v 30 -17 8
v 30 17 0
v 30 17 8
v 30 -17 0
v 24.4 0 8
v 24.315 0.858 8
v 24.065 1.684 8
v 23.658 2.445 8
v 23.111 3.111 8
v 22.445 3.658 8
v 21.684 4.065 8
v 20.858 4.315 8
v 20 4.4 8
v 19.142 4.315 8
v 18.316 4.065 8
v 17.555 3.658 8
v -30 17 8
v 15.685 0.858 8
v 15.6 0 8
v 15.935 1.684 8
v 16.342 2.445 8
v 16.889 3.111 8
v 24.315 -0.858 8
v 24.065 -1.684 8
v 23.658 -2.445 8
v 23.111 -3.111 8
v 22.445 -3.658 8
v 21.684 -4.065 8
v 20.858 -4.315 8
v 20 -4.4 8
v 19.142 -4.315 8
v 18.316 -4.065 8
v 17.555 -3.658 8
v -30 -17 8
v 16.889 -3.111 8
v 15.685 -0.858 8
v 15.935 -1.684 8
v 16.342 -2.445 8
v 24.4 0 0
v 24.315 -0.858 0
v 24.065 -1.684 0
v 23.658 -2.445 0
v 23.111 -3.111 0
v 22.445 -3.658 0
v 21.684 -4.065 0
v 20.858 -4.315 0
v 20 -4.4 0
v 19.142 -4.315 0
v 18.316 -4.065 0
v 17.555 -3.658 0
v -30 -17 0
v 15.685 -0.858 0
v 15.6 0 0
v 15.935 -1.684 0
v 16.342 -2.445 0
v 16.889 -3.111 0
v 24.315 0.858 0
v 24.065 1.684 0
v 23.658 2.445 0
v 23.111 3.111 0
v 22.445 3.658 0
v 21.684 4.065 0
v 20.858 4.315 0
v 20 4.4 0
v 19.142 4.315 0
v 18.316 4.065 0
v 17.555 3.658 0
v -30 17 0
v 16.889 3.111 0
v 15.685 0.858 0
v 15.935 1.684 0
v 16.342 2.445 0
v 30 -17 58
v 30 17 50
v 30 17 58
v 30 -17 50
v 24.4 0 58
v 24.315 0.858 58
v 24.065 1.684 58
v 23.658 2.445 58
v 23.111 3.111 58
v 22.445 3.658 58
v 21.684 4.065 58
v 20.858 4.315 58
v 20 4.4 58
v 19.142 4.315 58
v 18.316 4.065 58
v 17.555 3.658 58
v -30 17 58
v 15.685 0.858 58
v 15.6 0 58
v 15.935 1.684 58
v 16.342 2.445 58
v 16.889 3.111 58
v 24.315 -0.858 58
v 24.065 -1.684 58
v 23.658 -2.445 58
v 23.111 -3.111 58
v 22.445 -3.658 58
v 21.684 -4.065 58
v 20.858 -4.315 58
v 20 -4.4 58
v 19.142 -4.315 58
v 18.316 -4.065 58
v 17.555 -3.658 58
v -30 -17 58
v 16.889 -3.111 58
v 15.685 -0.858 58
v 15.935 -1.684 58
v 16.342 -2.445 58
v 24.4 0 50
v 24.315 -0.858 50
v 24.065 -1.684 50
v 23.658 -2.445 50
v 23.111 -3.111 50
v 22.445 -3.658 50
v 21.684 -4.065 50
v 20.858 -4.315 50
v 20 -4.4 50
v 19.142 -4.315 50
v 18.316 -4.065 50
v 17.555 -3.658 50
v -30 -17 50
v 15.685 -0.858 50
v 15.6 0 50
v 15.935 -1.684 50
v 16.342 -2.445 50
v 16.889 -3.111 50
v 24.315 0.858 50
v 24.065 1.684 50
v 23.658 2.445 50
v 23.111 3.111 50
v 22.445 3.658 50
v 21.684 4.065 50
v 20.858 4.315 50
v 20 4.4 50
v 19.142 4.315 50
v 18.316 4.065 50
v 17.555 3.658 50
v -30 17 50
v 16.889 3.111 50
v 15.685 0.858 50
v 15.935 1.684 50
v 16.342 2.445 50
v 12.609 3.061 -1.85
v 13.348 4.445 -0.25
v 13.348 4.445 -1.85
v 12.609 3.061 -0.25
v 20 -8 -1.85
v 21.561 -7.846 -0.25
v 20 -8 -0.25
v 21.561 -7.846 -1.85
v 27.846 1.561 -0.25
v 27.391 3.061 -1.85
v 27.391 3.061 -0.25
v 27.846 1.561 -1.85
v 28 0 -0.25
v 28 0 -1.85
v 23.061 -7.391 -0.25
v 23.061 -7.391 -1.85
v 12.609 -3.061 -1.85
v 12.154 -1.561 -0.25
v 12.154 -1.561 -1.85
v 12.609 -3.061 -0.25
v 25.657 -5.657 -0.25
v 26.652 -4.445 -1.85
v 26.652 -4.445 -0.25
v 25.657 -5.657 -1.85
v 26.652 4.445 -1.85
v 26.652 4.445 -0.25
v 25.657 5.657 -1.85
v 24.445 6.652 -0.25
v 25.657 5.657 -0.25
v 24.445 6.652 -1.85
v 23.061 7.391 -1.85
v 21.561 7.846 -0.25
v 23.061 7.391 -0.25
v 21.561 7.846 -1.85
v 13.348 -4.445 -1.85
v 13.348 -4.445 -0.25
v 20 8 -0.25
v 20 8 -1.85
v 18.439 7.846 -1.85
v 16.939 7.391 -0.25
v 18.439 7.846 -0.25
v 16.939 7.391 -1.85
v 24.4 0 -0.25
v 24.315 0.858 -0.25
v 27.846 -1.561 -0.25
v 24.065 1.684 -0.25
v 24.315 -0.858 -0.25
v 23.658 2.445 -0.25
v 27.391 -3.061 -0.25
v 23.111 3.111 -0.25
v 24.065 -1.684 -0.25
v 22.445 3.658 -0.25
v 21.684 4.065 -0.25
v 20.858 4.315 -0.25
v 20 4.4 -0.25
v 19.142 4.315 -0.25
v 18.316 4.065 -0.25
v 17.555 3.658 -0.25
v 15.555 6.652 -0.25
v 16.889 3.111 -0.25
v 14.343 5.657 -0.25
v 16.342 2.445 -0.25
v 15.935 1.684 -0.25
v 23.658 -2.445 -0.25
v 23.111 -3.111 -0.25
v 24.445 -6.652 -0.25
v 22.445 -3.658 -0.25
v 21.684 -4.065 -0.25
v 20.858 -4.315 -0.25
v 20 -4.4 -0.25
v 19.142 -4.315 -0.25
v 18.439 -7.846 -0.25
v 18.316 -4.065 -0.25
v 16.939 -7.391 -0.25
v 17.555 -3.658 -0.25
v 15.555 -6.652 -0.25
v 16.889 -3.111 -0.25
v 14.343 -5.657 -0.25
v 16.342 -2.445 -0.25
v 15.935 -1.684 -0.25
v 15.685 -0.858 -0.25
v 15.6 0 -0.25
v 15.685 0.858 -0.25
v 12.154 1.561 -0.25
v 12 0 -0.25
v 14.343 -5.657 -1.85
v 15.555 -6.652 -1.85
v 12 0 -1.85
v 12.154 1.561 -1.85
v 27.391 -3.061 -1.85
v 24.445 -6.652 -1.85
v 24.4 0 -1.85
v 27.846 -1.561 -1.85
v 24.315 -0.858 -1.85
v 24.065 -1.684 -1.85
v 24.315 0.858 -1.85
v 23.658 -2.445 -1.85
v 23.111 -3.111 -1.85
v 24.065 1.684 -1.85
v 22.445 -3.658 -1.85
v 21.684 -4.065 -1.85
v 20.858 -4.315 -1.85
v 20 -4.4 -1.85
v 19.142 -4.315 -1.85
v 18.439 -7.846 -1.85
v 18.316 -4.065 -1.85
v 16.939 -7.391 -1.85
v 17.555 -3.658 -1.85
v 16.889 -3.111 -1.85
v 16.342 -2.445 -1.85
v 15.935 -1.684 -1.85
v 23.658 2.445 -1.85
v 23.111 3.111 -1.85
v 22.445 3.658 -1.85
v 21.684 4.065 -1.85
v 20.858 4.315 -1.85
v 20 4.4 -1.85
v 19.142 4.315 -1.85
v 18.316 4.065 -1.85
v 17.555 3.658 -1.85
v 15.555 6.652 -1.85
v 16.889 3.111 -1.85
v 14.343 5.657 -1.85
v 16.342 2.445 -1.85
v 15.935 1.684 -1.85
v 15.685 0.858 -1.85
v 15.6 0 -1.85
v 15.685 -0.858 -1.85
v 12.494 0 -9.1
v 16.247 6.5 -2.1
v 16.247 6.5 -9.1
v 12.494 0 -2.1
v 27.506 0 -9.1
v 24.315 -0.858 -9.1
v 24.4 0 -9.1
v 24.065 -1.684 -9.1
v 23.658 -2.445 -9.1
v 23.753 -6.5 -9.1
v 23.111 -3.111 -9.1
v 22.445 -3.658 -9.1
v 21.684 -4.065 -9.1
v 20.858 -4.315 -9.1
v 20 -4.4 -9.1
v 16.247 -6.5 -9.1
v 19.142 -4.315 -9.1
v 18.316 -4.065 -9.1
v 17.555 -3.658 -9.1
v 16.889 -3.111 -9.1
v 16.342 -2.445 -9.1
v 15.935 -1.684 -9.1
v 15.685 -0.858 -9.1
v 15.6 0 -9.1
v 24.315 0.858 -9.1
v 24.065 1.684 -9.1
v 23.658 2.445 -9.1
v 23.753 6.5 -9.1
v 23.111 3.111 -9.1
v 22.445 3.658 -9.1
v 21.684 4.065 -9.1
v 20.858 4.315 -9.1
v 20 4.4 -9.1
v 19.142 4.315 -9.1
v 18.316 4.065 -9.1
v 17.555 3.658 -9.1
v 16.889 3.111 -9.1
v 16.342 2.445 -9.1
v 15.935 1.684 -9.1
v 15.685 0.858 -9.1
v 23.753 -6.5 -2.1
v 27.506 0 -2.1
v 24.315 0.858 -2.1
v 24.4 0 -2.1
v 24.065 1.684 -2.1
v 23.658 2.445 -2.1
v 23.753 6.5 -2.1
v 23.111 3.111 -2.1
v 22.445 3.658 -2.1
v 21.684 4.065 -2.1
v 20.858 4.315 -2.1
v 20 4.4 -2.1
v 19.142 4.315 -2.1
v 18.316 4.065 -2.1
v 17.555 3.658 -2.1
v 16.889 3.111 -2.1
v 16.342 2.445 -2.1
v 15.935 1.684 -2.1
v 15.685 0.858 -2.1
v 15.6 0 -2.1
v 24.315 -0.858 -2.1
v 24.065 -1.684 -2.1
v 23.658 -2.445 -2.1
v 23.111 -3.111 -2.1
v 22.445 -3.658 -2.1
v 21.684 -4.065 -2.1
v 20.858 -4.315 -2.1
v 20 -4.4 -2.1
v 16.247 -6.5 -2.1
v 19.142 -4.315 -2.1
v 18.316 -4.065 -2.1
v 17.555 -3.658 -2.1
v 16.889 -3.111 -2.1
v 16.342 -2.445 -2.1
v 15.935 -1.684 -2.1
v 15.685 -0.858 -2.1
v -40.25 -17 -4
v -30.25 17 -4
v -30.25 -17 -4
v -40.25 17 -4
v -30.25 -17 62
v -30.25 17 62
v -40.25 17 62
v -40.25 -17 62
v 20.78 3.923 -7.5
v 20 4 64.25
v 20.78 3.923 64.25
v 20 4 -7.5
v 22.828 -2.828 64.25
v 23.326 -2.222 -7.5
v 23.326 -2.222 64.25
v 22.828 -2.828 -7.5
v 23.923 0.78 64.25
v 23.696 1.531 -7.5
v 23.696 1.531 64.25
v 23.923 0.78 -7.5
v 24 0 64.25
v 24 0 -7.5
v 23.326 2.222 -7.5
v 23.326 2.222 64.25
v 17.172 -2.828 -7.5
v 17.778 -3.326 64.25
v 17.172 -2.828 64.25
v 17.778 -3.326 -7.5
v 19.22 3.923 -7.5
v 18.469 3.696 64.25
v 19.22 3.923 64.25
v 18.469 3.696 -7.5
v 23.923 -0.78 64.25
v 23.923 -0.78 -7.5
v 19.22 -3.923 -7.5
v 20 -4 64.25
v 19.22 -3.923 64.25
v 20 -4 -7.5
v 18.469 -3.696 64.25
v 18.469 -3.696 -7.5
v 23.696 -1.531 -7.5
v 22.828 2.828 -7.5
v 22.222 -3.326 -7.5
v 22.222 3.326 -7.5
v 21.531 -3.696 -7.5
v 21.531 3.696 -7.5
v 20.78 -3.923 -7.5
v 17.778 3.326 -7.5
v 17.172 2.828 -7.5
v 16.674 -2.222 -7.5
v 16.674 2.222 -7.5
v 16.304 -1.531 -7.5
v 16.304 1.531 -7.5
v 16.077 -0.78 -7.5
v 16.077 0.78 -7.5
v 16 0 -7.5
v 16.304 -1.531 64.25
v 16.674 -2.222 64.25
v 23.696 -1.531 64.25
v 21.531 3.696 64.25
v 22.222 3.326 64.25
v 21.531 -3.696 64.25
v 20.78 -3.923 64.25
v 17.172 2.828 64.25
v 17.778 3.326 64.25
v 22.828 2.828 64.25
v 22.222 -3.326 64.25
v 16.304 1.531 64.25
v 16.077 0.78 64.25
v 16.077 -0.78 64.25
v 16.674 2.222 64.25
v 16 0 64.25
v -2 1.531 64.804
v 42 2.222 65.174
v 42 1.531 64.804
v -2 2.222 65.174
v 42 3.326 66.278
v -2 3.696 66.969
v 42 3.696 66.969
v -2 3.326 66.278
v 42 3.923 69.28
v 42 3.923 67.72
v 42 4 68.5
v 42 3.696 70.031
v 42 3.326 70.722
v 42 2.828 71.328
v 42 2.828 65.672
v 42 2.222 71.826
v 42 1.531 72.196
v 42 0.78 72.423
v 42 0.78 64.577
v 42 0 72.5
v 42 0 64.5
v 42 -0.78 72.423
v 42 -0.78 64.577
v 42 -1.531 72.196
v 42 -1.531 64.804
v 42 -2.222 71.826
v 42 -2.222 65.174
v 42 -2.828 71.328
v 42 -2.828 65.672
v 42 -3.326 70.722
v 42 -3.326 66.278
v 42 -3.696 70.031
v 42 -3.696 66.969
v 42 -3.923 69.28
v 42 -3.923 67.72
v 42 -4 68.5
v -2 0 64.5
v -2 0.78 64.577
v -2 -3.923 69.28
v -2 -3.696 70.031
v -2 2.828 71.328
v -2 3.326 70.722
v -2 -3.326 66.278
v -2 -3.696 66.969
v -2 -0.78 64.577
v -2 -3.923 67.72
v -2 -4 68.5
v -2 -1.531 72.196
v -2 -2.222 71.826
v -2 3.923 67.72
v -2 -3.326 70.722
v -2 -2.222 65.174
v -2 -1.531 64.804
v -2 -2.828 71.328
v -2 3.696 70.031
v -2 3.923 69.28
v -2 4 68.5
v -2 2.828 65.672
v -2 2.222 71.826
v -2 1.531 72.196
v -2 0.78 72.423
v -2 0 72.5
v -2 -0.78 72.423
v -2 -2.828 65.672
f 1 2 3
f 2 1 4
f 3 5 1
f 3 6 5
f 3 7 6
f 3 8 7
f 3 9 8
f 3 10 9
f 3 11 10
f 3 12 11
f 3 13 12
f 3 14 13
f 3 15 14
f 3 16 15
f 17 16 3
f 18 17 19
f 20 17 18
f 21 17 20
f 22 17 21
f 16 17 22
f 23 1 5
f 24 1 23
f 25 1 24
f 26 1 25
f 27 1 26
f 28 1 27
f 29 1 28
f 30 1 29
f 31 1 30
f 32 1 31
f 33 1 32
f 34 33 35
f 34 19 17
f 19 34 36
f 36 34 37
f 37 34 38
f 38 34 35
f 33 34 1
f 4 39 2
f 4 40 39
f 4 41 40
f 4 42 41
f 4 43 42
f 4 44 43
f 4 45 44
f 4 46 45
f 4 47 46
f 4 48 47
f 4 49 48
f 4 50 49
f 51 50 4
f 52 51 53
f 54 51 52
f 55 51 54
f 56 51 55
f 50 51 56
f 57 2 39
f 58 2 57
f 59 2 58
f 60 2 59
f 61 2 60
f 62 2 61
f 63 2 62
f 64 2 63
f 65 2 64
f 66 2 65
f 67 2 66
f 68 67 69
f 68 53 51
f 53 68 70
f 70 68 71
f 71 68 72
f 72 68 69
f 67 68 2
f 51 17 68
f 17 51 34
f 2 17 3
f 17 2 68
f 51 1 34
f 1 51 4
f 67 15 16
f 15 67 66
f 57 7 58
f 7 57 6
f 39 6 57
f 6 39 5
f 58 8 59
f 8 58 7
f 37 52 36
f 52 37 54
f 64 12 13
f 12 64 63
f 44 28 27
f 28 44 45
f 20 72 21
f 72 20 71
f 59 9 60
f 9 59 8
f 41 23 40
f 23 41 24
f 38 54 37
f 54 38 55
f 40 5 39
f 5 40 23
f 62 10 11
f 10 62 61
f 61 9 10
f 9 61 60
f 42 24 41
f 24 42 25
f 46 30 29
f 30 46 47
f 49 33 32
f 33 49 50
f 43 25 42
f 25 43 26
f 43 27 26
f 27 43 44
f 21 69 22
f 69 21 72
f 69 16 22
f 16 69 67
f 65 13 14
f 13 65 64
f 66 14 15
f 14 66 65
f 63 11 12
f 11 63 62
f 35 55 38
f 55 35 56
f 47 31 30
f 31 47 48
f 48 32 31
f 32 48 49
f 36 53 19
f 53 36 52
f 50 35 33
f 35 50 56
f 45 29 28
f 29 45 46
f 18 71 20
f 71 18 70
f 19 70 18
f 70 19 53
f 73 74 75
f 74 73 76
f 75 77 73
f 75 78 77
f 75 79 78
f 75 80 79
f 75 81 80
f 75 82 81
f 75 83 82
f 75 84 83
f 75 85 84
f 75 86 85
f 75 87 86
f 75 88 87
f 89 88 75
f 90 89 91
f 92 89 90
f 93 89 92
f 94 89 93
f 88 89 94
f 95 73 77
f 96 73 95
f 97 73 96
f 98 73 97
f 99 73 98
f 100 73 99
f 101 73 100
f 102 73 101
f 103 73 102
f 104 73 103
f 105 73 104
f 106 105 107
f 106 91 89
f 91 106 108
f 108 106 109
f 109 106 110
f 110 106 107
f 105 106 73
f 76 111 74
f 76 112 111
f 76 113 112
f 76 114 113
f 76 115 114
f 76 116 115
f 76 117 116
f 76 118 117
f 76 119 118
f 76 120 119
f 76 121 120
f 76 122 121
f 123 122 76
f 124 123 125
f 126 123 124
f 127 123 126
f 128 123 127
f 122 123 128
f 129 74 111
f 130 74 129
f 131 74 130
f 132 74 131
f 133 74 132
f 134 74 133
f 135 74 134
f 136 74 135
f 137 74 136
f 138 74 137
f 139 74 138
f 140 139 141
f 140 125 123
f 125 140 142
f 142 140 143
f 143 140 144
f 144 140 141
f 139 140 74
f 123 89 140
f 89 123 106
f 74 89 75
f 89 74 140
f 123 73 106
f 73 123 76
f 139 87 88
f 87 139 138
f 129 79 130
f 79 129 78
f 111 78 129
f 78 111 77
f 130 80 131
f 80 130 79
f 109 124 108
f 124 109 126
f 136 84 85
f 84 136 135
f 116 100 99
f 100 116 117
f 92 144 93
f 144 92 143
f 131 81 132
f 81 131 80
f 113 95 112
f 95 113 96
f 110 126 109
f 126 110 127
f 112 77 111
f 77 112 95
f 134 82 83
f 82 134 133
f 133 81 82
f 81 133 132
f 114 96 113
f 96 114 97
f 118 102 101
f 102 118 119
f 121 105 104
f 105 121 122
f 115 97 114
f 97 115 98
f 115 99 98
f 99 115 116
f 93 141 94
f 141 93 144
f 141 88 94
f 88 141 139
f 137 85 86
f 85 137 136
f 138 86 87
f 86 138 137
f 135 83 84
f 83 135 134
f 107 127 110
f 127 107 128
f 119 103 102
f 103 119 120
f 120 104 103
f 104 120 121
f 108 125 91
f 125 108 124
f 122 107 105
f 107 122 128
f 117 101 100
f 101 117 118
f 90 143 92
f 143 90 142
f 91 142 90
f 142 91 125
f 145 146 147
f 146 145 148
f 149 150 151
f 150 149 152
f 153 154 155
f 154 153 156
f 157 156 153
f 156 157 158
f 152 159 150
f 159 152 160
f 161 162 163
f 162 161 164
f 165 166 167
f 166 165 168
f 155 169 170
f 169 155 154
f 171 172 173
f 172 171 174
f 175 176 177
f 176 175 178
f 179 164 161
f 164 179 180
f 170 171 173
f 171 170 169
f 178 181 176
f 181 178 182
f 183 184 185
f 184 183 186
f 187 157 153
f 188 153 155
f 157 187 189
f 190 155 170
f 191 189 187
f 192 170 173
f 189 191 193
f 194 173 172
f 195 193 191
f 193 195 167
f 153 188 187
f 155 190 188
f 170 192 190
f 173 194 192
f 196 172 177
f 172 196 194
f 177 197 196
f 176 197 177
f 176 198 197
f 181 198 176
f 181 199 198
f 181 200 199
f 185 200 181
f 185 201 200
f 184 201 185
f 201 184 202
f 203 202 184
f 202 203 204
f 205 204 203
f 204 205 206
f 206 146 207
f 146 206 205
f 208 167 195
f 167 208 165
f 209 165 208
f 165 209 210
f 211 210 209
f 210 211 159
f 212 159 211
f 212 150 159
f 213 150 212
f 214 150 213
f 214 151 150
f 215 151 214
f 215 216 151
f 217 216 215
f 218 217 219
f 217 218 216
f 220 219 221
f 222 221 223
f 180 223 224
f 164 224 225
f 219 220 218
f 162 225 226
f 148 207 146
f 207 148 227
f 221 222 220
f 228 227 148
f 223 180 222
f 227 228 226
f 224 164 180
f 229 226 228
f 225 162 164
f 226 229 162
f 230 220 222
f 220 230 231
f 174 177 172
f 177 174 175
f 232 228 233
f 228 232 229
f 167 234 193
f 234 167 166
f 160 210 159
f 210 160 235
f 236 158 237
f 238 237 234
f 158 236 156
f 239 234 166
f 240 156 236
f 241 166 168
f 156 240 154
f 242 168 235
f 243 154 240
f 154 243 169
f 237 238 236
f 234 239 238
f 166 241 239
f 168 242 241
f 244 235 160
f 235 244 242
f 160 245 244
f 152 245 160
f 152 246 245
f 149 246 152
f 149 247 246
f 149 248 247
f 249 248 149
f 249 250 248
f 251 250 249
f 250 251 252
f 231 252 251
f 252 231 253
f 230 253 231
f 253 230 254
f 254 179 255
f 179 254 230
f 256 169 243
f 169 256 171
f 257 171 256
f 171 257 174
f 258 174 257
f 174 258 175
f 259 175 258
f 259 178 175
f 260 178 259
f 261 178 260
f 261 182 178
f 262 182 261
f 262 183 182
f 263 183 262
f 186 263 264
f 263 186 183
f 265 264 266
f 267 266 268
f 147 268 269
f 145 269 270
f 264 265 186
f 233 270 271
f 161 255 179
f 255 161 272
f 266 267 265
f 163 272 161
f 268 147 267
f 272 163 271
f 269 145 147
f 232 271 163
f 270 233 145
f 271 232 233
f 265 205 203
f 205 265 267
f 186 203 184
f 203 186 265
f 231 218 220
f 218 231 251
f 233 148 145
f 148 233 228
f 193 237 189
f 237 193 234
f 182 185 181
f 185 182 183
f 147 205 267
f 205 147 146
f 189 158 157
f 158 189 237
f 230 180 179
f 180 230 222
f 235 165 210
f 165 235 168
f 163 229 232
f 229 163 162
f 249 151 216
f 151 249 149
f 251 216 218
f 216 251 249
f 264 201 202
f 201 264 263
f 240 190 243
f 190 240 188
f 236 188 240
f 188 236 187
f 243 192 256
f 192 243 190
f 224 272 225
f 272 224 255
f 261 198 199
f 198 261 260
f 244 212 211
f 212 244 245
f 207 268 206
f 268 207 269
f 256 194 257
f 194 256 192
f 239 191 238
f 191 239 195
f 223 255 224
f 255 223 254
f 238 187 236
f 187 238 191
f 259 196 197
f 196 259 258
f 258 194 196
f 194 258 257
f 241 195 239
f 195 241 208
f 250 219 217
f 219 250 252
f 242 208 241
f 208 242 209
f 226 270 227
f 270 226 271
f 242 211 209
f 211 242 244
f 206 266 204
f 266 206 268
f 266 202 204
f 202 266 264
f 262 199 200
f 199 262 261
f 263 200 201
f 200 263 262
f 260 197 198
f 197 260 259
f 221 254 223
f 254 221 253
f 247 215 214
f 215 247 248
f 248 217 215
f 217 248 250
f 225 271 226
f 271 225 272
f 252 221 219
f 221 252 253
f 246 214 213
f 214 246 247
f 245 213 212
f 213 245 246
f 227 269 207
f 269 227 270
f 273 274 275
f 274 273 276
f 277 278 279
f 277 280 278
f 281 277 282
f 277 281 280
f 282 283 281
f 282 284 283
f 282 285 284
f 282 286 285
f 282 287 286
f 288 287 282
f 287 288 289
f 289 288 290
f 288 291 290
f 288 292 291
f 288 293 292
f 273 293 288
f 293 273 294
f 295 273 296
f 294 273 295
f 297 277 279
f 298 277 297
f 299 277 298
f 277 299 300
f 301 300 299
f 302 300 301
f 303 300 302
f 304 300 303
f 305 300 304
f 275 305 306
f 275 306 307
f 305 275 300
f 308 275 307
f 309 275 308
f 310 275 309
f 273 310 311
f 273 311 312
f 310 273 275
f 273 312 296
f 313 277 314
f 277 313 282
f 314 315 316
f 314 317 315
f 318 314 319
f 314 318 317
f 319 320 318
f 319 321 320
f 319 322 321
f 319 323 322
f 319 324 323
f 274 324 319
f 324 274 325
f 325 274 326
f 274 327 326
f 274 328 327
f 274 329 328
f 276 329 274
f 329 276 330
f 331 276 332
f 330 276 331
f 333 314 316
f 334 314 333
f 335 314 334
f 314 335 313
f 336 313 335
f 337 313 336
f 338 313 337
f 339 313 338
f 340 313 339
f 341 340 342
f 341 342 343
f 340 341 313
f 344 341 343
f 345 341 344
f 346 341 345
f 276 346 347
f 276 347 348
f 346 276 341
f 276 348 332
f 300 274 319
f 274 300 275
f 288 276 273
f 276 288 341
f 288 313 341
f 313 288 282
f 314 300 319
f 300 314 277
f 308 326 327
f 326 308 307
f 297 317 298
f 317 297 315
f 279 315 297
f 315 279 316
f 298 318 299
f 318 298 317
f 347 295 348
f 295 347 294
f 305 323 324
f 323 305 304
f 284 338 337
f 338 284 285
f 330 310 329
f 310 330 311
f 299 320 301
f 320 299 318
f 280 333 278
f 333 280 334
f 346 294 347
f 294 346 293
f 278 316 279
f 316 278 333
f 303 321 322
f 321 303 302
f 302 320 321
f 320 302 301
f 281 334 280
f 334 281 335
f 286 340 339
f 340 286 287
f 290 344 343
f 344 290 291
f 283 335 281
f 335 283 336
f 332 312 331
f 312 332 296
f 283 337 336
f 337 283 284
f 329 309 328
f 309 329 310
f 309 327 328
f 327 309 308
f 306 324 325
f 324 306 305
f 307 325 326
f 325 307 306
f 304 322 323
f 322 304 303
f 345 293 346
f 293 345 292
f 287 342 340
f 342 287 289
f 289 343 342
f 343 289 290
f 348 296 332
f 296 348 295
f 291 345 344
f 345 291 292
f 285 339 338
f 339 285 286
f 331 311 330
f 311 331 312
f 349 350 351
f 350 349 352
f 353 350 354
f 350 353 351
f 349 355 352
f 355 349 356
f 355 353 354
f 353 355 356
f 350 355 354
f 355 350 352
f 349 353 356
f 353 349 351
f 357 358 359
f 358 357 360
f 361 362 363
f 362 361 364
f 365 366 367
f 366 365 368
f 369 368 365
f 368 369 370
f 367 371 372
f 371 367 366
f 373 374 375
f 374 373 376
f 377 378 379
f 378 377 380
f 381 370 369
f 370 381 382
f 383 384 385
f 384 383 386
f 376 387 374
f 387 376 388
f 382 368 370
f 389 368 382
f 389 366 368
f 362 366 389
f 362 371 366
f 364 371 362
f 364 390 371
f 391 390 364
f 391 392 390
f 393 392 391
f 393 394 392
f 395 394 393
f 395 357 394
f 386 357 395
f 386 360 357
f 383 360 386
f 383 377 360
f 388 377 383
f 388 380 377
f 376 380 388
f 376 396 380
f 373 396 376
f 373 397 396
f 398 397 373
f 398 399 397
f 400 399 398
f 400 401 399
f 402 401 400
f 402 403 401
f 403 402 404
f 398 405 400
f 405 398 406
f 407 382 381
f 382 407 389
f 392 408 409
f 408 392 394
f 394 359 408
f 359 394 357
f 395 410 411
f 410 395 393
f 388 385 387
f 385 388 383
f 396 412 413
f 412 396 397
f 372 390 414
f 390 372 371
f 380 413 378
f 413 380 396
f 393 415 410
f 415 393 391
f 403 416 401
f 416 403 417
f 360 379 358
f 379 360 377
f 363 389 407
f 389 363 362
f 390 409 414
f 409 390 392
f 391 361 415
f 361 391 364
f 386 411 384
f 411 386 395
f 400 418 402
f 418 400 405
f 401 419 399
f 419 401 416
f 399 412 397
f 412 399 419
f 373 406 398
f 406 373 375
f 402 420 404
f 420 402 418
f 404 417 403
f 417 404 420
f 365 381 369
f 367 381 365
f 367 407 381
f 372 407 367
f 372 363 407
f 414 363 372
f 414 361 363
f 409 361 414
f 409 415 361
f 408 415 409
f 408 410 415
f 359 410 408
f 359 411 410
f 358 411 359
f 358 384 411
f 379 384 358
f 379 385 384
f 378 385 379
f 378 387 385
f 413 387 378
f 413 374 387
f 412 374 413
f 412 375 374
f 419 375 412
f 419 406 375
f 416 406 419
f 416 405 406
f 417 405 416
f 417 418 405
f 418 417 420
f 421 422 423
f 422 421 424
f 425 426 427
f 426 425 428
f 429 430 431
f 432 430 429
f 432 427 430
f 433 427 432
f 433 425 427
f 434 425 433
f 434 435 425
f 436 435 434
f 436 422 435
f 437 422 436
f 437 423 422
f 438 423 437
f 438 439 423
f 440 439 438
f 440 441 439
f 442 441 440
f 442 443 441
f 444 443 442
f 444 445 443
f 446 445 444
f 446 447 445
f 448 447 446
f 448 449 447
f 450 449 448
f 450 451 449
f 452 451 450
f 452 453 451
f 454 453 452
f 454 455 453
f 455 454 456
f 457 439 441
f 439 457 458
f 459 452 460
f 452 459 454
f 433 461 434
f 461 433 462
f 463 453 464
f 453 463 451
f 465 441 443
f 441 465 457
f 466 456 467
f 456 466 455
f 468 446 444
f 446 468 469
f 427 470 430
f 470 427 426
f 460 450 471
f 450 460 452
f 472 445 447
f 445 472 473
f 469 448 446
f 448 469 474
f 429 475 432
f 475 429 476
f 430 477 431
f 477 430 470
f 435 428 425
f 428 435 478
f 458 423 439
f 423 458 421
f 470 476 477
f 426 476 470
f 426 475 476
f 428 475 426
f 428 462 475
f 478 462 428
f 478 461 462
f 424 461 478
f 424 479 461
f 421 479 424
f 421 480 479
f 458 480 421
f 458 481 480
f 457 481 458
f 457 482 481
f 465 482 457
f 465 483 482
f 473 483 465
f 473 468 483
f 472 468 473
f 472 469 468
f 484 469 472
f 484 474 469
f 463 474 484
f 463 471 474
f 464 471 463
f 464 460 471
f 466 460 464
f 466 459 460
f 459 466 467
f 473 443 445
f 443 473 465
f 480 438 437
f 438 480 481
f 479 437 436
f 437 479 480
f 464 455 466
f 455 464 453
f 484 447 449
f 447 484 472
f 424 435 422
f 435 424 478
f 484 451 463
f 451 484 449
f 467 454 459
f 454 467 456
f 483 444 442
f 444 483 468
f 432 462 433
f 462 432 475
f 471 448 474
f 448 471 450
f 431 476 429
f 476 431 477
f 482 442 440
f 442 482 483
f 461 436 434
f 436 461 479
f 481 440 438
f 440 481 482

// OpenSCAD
$fn = 32;

// ------------------------------------------------------------------------
// C clamp: throat 50 mm, screw d8
// Every part is its own module, assembly() places every instance.
// ------------------------------------------------------------------------

// --- part 1 ---
module clamp_arm() {
  difference() {
    translate([-30, -17, 0]) cube([60, 34, 8]);
    translate([20, 0, -1]) cylinder(h = 10, d = 8.8);
  }
}

// --- part 2 ---
module clamp_spine() {
  difference() {
    translate([-33, -17, 0]) cube([66, 34, 10]);
  }
}

// --- part 3 ---
module clamp_screw() {
  translate([0, 0, -35.875]) cylinder(h = 71.75, d = 8);
}

// --- part 4 ---
module clamp_washer() {
  difference() {
      translate([0, 0, 0]) cylinder(h = 1.6, d = 16);
      translate([0, 0, -1]) cylinder(h = 3.6, d = 8.8);
    }
}

// --- part 5 ---
module clamp_nut() {
  difference() {
    linear_extrude(height = 7) polygon(points = [[7.506, 0], [3.753, 6.5], [-3.753, 6.5], [-7.506, 0], [-3.753, -6.5], [3.753, -6.5]]);
    translate([0, 0, -1]) cylinder(h = 9, d = 8.8);
  }
}

// --- part 6 ---
module tommy_bar() {
  translate([0, 0, -22]) cylinder(h = 44, d = 8);
}

// --- assembly ---
module assembly() {
  color([0.80, 0.24, 0.20]) translate([0, 0, 0]) rotate([0, 0, 0]) clamp_arm();
  color([0.20, 0.45, 0.75]) translate([0, 0, 50]) rotate([0, 0, 0]) clamp_arm();
  color([0.25, 0.62, 0.32]) translate([-40.25, 0, 29]) rotate([0, 90, 0]) clamp_spine();
  color([0.92, 0.70, 0.18]) translate([20, 0, 28.375]) rotate([0, 0, 0]) clamp_screw();
  color([0.58, 0.35, 0.70]) translate([20, 0, -1.85]) rotate([0, 0, 0]) clamp_washer();
  color([0.16, 0.66, 0.66]) translate([20, 0, -9.1]) rotate([0, 0, 0]) clamp_nut();
  color([0.85, 0.48, 0.18]) translate([20, 0, 68.5]) rotate([0, 90, 0]) tommy_bar();
}

assembly();
